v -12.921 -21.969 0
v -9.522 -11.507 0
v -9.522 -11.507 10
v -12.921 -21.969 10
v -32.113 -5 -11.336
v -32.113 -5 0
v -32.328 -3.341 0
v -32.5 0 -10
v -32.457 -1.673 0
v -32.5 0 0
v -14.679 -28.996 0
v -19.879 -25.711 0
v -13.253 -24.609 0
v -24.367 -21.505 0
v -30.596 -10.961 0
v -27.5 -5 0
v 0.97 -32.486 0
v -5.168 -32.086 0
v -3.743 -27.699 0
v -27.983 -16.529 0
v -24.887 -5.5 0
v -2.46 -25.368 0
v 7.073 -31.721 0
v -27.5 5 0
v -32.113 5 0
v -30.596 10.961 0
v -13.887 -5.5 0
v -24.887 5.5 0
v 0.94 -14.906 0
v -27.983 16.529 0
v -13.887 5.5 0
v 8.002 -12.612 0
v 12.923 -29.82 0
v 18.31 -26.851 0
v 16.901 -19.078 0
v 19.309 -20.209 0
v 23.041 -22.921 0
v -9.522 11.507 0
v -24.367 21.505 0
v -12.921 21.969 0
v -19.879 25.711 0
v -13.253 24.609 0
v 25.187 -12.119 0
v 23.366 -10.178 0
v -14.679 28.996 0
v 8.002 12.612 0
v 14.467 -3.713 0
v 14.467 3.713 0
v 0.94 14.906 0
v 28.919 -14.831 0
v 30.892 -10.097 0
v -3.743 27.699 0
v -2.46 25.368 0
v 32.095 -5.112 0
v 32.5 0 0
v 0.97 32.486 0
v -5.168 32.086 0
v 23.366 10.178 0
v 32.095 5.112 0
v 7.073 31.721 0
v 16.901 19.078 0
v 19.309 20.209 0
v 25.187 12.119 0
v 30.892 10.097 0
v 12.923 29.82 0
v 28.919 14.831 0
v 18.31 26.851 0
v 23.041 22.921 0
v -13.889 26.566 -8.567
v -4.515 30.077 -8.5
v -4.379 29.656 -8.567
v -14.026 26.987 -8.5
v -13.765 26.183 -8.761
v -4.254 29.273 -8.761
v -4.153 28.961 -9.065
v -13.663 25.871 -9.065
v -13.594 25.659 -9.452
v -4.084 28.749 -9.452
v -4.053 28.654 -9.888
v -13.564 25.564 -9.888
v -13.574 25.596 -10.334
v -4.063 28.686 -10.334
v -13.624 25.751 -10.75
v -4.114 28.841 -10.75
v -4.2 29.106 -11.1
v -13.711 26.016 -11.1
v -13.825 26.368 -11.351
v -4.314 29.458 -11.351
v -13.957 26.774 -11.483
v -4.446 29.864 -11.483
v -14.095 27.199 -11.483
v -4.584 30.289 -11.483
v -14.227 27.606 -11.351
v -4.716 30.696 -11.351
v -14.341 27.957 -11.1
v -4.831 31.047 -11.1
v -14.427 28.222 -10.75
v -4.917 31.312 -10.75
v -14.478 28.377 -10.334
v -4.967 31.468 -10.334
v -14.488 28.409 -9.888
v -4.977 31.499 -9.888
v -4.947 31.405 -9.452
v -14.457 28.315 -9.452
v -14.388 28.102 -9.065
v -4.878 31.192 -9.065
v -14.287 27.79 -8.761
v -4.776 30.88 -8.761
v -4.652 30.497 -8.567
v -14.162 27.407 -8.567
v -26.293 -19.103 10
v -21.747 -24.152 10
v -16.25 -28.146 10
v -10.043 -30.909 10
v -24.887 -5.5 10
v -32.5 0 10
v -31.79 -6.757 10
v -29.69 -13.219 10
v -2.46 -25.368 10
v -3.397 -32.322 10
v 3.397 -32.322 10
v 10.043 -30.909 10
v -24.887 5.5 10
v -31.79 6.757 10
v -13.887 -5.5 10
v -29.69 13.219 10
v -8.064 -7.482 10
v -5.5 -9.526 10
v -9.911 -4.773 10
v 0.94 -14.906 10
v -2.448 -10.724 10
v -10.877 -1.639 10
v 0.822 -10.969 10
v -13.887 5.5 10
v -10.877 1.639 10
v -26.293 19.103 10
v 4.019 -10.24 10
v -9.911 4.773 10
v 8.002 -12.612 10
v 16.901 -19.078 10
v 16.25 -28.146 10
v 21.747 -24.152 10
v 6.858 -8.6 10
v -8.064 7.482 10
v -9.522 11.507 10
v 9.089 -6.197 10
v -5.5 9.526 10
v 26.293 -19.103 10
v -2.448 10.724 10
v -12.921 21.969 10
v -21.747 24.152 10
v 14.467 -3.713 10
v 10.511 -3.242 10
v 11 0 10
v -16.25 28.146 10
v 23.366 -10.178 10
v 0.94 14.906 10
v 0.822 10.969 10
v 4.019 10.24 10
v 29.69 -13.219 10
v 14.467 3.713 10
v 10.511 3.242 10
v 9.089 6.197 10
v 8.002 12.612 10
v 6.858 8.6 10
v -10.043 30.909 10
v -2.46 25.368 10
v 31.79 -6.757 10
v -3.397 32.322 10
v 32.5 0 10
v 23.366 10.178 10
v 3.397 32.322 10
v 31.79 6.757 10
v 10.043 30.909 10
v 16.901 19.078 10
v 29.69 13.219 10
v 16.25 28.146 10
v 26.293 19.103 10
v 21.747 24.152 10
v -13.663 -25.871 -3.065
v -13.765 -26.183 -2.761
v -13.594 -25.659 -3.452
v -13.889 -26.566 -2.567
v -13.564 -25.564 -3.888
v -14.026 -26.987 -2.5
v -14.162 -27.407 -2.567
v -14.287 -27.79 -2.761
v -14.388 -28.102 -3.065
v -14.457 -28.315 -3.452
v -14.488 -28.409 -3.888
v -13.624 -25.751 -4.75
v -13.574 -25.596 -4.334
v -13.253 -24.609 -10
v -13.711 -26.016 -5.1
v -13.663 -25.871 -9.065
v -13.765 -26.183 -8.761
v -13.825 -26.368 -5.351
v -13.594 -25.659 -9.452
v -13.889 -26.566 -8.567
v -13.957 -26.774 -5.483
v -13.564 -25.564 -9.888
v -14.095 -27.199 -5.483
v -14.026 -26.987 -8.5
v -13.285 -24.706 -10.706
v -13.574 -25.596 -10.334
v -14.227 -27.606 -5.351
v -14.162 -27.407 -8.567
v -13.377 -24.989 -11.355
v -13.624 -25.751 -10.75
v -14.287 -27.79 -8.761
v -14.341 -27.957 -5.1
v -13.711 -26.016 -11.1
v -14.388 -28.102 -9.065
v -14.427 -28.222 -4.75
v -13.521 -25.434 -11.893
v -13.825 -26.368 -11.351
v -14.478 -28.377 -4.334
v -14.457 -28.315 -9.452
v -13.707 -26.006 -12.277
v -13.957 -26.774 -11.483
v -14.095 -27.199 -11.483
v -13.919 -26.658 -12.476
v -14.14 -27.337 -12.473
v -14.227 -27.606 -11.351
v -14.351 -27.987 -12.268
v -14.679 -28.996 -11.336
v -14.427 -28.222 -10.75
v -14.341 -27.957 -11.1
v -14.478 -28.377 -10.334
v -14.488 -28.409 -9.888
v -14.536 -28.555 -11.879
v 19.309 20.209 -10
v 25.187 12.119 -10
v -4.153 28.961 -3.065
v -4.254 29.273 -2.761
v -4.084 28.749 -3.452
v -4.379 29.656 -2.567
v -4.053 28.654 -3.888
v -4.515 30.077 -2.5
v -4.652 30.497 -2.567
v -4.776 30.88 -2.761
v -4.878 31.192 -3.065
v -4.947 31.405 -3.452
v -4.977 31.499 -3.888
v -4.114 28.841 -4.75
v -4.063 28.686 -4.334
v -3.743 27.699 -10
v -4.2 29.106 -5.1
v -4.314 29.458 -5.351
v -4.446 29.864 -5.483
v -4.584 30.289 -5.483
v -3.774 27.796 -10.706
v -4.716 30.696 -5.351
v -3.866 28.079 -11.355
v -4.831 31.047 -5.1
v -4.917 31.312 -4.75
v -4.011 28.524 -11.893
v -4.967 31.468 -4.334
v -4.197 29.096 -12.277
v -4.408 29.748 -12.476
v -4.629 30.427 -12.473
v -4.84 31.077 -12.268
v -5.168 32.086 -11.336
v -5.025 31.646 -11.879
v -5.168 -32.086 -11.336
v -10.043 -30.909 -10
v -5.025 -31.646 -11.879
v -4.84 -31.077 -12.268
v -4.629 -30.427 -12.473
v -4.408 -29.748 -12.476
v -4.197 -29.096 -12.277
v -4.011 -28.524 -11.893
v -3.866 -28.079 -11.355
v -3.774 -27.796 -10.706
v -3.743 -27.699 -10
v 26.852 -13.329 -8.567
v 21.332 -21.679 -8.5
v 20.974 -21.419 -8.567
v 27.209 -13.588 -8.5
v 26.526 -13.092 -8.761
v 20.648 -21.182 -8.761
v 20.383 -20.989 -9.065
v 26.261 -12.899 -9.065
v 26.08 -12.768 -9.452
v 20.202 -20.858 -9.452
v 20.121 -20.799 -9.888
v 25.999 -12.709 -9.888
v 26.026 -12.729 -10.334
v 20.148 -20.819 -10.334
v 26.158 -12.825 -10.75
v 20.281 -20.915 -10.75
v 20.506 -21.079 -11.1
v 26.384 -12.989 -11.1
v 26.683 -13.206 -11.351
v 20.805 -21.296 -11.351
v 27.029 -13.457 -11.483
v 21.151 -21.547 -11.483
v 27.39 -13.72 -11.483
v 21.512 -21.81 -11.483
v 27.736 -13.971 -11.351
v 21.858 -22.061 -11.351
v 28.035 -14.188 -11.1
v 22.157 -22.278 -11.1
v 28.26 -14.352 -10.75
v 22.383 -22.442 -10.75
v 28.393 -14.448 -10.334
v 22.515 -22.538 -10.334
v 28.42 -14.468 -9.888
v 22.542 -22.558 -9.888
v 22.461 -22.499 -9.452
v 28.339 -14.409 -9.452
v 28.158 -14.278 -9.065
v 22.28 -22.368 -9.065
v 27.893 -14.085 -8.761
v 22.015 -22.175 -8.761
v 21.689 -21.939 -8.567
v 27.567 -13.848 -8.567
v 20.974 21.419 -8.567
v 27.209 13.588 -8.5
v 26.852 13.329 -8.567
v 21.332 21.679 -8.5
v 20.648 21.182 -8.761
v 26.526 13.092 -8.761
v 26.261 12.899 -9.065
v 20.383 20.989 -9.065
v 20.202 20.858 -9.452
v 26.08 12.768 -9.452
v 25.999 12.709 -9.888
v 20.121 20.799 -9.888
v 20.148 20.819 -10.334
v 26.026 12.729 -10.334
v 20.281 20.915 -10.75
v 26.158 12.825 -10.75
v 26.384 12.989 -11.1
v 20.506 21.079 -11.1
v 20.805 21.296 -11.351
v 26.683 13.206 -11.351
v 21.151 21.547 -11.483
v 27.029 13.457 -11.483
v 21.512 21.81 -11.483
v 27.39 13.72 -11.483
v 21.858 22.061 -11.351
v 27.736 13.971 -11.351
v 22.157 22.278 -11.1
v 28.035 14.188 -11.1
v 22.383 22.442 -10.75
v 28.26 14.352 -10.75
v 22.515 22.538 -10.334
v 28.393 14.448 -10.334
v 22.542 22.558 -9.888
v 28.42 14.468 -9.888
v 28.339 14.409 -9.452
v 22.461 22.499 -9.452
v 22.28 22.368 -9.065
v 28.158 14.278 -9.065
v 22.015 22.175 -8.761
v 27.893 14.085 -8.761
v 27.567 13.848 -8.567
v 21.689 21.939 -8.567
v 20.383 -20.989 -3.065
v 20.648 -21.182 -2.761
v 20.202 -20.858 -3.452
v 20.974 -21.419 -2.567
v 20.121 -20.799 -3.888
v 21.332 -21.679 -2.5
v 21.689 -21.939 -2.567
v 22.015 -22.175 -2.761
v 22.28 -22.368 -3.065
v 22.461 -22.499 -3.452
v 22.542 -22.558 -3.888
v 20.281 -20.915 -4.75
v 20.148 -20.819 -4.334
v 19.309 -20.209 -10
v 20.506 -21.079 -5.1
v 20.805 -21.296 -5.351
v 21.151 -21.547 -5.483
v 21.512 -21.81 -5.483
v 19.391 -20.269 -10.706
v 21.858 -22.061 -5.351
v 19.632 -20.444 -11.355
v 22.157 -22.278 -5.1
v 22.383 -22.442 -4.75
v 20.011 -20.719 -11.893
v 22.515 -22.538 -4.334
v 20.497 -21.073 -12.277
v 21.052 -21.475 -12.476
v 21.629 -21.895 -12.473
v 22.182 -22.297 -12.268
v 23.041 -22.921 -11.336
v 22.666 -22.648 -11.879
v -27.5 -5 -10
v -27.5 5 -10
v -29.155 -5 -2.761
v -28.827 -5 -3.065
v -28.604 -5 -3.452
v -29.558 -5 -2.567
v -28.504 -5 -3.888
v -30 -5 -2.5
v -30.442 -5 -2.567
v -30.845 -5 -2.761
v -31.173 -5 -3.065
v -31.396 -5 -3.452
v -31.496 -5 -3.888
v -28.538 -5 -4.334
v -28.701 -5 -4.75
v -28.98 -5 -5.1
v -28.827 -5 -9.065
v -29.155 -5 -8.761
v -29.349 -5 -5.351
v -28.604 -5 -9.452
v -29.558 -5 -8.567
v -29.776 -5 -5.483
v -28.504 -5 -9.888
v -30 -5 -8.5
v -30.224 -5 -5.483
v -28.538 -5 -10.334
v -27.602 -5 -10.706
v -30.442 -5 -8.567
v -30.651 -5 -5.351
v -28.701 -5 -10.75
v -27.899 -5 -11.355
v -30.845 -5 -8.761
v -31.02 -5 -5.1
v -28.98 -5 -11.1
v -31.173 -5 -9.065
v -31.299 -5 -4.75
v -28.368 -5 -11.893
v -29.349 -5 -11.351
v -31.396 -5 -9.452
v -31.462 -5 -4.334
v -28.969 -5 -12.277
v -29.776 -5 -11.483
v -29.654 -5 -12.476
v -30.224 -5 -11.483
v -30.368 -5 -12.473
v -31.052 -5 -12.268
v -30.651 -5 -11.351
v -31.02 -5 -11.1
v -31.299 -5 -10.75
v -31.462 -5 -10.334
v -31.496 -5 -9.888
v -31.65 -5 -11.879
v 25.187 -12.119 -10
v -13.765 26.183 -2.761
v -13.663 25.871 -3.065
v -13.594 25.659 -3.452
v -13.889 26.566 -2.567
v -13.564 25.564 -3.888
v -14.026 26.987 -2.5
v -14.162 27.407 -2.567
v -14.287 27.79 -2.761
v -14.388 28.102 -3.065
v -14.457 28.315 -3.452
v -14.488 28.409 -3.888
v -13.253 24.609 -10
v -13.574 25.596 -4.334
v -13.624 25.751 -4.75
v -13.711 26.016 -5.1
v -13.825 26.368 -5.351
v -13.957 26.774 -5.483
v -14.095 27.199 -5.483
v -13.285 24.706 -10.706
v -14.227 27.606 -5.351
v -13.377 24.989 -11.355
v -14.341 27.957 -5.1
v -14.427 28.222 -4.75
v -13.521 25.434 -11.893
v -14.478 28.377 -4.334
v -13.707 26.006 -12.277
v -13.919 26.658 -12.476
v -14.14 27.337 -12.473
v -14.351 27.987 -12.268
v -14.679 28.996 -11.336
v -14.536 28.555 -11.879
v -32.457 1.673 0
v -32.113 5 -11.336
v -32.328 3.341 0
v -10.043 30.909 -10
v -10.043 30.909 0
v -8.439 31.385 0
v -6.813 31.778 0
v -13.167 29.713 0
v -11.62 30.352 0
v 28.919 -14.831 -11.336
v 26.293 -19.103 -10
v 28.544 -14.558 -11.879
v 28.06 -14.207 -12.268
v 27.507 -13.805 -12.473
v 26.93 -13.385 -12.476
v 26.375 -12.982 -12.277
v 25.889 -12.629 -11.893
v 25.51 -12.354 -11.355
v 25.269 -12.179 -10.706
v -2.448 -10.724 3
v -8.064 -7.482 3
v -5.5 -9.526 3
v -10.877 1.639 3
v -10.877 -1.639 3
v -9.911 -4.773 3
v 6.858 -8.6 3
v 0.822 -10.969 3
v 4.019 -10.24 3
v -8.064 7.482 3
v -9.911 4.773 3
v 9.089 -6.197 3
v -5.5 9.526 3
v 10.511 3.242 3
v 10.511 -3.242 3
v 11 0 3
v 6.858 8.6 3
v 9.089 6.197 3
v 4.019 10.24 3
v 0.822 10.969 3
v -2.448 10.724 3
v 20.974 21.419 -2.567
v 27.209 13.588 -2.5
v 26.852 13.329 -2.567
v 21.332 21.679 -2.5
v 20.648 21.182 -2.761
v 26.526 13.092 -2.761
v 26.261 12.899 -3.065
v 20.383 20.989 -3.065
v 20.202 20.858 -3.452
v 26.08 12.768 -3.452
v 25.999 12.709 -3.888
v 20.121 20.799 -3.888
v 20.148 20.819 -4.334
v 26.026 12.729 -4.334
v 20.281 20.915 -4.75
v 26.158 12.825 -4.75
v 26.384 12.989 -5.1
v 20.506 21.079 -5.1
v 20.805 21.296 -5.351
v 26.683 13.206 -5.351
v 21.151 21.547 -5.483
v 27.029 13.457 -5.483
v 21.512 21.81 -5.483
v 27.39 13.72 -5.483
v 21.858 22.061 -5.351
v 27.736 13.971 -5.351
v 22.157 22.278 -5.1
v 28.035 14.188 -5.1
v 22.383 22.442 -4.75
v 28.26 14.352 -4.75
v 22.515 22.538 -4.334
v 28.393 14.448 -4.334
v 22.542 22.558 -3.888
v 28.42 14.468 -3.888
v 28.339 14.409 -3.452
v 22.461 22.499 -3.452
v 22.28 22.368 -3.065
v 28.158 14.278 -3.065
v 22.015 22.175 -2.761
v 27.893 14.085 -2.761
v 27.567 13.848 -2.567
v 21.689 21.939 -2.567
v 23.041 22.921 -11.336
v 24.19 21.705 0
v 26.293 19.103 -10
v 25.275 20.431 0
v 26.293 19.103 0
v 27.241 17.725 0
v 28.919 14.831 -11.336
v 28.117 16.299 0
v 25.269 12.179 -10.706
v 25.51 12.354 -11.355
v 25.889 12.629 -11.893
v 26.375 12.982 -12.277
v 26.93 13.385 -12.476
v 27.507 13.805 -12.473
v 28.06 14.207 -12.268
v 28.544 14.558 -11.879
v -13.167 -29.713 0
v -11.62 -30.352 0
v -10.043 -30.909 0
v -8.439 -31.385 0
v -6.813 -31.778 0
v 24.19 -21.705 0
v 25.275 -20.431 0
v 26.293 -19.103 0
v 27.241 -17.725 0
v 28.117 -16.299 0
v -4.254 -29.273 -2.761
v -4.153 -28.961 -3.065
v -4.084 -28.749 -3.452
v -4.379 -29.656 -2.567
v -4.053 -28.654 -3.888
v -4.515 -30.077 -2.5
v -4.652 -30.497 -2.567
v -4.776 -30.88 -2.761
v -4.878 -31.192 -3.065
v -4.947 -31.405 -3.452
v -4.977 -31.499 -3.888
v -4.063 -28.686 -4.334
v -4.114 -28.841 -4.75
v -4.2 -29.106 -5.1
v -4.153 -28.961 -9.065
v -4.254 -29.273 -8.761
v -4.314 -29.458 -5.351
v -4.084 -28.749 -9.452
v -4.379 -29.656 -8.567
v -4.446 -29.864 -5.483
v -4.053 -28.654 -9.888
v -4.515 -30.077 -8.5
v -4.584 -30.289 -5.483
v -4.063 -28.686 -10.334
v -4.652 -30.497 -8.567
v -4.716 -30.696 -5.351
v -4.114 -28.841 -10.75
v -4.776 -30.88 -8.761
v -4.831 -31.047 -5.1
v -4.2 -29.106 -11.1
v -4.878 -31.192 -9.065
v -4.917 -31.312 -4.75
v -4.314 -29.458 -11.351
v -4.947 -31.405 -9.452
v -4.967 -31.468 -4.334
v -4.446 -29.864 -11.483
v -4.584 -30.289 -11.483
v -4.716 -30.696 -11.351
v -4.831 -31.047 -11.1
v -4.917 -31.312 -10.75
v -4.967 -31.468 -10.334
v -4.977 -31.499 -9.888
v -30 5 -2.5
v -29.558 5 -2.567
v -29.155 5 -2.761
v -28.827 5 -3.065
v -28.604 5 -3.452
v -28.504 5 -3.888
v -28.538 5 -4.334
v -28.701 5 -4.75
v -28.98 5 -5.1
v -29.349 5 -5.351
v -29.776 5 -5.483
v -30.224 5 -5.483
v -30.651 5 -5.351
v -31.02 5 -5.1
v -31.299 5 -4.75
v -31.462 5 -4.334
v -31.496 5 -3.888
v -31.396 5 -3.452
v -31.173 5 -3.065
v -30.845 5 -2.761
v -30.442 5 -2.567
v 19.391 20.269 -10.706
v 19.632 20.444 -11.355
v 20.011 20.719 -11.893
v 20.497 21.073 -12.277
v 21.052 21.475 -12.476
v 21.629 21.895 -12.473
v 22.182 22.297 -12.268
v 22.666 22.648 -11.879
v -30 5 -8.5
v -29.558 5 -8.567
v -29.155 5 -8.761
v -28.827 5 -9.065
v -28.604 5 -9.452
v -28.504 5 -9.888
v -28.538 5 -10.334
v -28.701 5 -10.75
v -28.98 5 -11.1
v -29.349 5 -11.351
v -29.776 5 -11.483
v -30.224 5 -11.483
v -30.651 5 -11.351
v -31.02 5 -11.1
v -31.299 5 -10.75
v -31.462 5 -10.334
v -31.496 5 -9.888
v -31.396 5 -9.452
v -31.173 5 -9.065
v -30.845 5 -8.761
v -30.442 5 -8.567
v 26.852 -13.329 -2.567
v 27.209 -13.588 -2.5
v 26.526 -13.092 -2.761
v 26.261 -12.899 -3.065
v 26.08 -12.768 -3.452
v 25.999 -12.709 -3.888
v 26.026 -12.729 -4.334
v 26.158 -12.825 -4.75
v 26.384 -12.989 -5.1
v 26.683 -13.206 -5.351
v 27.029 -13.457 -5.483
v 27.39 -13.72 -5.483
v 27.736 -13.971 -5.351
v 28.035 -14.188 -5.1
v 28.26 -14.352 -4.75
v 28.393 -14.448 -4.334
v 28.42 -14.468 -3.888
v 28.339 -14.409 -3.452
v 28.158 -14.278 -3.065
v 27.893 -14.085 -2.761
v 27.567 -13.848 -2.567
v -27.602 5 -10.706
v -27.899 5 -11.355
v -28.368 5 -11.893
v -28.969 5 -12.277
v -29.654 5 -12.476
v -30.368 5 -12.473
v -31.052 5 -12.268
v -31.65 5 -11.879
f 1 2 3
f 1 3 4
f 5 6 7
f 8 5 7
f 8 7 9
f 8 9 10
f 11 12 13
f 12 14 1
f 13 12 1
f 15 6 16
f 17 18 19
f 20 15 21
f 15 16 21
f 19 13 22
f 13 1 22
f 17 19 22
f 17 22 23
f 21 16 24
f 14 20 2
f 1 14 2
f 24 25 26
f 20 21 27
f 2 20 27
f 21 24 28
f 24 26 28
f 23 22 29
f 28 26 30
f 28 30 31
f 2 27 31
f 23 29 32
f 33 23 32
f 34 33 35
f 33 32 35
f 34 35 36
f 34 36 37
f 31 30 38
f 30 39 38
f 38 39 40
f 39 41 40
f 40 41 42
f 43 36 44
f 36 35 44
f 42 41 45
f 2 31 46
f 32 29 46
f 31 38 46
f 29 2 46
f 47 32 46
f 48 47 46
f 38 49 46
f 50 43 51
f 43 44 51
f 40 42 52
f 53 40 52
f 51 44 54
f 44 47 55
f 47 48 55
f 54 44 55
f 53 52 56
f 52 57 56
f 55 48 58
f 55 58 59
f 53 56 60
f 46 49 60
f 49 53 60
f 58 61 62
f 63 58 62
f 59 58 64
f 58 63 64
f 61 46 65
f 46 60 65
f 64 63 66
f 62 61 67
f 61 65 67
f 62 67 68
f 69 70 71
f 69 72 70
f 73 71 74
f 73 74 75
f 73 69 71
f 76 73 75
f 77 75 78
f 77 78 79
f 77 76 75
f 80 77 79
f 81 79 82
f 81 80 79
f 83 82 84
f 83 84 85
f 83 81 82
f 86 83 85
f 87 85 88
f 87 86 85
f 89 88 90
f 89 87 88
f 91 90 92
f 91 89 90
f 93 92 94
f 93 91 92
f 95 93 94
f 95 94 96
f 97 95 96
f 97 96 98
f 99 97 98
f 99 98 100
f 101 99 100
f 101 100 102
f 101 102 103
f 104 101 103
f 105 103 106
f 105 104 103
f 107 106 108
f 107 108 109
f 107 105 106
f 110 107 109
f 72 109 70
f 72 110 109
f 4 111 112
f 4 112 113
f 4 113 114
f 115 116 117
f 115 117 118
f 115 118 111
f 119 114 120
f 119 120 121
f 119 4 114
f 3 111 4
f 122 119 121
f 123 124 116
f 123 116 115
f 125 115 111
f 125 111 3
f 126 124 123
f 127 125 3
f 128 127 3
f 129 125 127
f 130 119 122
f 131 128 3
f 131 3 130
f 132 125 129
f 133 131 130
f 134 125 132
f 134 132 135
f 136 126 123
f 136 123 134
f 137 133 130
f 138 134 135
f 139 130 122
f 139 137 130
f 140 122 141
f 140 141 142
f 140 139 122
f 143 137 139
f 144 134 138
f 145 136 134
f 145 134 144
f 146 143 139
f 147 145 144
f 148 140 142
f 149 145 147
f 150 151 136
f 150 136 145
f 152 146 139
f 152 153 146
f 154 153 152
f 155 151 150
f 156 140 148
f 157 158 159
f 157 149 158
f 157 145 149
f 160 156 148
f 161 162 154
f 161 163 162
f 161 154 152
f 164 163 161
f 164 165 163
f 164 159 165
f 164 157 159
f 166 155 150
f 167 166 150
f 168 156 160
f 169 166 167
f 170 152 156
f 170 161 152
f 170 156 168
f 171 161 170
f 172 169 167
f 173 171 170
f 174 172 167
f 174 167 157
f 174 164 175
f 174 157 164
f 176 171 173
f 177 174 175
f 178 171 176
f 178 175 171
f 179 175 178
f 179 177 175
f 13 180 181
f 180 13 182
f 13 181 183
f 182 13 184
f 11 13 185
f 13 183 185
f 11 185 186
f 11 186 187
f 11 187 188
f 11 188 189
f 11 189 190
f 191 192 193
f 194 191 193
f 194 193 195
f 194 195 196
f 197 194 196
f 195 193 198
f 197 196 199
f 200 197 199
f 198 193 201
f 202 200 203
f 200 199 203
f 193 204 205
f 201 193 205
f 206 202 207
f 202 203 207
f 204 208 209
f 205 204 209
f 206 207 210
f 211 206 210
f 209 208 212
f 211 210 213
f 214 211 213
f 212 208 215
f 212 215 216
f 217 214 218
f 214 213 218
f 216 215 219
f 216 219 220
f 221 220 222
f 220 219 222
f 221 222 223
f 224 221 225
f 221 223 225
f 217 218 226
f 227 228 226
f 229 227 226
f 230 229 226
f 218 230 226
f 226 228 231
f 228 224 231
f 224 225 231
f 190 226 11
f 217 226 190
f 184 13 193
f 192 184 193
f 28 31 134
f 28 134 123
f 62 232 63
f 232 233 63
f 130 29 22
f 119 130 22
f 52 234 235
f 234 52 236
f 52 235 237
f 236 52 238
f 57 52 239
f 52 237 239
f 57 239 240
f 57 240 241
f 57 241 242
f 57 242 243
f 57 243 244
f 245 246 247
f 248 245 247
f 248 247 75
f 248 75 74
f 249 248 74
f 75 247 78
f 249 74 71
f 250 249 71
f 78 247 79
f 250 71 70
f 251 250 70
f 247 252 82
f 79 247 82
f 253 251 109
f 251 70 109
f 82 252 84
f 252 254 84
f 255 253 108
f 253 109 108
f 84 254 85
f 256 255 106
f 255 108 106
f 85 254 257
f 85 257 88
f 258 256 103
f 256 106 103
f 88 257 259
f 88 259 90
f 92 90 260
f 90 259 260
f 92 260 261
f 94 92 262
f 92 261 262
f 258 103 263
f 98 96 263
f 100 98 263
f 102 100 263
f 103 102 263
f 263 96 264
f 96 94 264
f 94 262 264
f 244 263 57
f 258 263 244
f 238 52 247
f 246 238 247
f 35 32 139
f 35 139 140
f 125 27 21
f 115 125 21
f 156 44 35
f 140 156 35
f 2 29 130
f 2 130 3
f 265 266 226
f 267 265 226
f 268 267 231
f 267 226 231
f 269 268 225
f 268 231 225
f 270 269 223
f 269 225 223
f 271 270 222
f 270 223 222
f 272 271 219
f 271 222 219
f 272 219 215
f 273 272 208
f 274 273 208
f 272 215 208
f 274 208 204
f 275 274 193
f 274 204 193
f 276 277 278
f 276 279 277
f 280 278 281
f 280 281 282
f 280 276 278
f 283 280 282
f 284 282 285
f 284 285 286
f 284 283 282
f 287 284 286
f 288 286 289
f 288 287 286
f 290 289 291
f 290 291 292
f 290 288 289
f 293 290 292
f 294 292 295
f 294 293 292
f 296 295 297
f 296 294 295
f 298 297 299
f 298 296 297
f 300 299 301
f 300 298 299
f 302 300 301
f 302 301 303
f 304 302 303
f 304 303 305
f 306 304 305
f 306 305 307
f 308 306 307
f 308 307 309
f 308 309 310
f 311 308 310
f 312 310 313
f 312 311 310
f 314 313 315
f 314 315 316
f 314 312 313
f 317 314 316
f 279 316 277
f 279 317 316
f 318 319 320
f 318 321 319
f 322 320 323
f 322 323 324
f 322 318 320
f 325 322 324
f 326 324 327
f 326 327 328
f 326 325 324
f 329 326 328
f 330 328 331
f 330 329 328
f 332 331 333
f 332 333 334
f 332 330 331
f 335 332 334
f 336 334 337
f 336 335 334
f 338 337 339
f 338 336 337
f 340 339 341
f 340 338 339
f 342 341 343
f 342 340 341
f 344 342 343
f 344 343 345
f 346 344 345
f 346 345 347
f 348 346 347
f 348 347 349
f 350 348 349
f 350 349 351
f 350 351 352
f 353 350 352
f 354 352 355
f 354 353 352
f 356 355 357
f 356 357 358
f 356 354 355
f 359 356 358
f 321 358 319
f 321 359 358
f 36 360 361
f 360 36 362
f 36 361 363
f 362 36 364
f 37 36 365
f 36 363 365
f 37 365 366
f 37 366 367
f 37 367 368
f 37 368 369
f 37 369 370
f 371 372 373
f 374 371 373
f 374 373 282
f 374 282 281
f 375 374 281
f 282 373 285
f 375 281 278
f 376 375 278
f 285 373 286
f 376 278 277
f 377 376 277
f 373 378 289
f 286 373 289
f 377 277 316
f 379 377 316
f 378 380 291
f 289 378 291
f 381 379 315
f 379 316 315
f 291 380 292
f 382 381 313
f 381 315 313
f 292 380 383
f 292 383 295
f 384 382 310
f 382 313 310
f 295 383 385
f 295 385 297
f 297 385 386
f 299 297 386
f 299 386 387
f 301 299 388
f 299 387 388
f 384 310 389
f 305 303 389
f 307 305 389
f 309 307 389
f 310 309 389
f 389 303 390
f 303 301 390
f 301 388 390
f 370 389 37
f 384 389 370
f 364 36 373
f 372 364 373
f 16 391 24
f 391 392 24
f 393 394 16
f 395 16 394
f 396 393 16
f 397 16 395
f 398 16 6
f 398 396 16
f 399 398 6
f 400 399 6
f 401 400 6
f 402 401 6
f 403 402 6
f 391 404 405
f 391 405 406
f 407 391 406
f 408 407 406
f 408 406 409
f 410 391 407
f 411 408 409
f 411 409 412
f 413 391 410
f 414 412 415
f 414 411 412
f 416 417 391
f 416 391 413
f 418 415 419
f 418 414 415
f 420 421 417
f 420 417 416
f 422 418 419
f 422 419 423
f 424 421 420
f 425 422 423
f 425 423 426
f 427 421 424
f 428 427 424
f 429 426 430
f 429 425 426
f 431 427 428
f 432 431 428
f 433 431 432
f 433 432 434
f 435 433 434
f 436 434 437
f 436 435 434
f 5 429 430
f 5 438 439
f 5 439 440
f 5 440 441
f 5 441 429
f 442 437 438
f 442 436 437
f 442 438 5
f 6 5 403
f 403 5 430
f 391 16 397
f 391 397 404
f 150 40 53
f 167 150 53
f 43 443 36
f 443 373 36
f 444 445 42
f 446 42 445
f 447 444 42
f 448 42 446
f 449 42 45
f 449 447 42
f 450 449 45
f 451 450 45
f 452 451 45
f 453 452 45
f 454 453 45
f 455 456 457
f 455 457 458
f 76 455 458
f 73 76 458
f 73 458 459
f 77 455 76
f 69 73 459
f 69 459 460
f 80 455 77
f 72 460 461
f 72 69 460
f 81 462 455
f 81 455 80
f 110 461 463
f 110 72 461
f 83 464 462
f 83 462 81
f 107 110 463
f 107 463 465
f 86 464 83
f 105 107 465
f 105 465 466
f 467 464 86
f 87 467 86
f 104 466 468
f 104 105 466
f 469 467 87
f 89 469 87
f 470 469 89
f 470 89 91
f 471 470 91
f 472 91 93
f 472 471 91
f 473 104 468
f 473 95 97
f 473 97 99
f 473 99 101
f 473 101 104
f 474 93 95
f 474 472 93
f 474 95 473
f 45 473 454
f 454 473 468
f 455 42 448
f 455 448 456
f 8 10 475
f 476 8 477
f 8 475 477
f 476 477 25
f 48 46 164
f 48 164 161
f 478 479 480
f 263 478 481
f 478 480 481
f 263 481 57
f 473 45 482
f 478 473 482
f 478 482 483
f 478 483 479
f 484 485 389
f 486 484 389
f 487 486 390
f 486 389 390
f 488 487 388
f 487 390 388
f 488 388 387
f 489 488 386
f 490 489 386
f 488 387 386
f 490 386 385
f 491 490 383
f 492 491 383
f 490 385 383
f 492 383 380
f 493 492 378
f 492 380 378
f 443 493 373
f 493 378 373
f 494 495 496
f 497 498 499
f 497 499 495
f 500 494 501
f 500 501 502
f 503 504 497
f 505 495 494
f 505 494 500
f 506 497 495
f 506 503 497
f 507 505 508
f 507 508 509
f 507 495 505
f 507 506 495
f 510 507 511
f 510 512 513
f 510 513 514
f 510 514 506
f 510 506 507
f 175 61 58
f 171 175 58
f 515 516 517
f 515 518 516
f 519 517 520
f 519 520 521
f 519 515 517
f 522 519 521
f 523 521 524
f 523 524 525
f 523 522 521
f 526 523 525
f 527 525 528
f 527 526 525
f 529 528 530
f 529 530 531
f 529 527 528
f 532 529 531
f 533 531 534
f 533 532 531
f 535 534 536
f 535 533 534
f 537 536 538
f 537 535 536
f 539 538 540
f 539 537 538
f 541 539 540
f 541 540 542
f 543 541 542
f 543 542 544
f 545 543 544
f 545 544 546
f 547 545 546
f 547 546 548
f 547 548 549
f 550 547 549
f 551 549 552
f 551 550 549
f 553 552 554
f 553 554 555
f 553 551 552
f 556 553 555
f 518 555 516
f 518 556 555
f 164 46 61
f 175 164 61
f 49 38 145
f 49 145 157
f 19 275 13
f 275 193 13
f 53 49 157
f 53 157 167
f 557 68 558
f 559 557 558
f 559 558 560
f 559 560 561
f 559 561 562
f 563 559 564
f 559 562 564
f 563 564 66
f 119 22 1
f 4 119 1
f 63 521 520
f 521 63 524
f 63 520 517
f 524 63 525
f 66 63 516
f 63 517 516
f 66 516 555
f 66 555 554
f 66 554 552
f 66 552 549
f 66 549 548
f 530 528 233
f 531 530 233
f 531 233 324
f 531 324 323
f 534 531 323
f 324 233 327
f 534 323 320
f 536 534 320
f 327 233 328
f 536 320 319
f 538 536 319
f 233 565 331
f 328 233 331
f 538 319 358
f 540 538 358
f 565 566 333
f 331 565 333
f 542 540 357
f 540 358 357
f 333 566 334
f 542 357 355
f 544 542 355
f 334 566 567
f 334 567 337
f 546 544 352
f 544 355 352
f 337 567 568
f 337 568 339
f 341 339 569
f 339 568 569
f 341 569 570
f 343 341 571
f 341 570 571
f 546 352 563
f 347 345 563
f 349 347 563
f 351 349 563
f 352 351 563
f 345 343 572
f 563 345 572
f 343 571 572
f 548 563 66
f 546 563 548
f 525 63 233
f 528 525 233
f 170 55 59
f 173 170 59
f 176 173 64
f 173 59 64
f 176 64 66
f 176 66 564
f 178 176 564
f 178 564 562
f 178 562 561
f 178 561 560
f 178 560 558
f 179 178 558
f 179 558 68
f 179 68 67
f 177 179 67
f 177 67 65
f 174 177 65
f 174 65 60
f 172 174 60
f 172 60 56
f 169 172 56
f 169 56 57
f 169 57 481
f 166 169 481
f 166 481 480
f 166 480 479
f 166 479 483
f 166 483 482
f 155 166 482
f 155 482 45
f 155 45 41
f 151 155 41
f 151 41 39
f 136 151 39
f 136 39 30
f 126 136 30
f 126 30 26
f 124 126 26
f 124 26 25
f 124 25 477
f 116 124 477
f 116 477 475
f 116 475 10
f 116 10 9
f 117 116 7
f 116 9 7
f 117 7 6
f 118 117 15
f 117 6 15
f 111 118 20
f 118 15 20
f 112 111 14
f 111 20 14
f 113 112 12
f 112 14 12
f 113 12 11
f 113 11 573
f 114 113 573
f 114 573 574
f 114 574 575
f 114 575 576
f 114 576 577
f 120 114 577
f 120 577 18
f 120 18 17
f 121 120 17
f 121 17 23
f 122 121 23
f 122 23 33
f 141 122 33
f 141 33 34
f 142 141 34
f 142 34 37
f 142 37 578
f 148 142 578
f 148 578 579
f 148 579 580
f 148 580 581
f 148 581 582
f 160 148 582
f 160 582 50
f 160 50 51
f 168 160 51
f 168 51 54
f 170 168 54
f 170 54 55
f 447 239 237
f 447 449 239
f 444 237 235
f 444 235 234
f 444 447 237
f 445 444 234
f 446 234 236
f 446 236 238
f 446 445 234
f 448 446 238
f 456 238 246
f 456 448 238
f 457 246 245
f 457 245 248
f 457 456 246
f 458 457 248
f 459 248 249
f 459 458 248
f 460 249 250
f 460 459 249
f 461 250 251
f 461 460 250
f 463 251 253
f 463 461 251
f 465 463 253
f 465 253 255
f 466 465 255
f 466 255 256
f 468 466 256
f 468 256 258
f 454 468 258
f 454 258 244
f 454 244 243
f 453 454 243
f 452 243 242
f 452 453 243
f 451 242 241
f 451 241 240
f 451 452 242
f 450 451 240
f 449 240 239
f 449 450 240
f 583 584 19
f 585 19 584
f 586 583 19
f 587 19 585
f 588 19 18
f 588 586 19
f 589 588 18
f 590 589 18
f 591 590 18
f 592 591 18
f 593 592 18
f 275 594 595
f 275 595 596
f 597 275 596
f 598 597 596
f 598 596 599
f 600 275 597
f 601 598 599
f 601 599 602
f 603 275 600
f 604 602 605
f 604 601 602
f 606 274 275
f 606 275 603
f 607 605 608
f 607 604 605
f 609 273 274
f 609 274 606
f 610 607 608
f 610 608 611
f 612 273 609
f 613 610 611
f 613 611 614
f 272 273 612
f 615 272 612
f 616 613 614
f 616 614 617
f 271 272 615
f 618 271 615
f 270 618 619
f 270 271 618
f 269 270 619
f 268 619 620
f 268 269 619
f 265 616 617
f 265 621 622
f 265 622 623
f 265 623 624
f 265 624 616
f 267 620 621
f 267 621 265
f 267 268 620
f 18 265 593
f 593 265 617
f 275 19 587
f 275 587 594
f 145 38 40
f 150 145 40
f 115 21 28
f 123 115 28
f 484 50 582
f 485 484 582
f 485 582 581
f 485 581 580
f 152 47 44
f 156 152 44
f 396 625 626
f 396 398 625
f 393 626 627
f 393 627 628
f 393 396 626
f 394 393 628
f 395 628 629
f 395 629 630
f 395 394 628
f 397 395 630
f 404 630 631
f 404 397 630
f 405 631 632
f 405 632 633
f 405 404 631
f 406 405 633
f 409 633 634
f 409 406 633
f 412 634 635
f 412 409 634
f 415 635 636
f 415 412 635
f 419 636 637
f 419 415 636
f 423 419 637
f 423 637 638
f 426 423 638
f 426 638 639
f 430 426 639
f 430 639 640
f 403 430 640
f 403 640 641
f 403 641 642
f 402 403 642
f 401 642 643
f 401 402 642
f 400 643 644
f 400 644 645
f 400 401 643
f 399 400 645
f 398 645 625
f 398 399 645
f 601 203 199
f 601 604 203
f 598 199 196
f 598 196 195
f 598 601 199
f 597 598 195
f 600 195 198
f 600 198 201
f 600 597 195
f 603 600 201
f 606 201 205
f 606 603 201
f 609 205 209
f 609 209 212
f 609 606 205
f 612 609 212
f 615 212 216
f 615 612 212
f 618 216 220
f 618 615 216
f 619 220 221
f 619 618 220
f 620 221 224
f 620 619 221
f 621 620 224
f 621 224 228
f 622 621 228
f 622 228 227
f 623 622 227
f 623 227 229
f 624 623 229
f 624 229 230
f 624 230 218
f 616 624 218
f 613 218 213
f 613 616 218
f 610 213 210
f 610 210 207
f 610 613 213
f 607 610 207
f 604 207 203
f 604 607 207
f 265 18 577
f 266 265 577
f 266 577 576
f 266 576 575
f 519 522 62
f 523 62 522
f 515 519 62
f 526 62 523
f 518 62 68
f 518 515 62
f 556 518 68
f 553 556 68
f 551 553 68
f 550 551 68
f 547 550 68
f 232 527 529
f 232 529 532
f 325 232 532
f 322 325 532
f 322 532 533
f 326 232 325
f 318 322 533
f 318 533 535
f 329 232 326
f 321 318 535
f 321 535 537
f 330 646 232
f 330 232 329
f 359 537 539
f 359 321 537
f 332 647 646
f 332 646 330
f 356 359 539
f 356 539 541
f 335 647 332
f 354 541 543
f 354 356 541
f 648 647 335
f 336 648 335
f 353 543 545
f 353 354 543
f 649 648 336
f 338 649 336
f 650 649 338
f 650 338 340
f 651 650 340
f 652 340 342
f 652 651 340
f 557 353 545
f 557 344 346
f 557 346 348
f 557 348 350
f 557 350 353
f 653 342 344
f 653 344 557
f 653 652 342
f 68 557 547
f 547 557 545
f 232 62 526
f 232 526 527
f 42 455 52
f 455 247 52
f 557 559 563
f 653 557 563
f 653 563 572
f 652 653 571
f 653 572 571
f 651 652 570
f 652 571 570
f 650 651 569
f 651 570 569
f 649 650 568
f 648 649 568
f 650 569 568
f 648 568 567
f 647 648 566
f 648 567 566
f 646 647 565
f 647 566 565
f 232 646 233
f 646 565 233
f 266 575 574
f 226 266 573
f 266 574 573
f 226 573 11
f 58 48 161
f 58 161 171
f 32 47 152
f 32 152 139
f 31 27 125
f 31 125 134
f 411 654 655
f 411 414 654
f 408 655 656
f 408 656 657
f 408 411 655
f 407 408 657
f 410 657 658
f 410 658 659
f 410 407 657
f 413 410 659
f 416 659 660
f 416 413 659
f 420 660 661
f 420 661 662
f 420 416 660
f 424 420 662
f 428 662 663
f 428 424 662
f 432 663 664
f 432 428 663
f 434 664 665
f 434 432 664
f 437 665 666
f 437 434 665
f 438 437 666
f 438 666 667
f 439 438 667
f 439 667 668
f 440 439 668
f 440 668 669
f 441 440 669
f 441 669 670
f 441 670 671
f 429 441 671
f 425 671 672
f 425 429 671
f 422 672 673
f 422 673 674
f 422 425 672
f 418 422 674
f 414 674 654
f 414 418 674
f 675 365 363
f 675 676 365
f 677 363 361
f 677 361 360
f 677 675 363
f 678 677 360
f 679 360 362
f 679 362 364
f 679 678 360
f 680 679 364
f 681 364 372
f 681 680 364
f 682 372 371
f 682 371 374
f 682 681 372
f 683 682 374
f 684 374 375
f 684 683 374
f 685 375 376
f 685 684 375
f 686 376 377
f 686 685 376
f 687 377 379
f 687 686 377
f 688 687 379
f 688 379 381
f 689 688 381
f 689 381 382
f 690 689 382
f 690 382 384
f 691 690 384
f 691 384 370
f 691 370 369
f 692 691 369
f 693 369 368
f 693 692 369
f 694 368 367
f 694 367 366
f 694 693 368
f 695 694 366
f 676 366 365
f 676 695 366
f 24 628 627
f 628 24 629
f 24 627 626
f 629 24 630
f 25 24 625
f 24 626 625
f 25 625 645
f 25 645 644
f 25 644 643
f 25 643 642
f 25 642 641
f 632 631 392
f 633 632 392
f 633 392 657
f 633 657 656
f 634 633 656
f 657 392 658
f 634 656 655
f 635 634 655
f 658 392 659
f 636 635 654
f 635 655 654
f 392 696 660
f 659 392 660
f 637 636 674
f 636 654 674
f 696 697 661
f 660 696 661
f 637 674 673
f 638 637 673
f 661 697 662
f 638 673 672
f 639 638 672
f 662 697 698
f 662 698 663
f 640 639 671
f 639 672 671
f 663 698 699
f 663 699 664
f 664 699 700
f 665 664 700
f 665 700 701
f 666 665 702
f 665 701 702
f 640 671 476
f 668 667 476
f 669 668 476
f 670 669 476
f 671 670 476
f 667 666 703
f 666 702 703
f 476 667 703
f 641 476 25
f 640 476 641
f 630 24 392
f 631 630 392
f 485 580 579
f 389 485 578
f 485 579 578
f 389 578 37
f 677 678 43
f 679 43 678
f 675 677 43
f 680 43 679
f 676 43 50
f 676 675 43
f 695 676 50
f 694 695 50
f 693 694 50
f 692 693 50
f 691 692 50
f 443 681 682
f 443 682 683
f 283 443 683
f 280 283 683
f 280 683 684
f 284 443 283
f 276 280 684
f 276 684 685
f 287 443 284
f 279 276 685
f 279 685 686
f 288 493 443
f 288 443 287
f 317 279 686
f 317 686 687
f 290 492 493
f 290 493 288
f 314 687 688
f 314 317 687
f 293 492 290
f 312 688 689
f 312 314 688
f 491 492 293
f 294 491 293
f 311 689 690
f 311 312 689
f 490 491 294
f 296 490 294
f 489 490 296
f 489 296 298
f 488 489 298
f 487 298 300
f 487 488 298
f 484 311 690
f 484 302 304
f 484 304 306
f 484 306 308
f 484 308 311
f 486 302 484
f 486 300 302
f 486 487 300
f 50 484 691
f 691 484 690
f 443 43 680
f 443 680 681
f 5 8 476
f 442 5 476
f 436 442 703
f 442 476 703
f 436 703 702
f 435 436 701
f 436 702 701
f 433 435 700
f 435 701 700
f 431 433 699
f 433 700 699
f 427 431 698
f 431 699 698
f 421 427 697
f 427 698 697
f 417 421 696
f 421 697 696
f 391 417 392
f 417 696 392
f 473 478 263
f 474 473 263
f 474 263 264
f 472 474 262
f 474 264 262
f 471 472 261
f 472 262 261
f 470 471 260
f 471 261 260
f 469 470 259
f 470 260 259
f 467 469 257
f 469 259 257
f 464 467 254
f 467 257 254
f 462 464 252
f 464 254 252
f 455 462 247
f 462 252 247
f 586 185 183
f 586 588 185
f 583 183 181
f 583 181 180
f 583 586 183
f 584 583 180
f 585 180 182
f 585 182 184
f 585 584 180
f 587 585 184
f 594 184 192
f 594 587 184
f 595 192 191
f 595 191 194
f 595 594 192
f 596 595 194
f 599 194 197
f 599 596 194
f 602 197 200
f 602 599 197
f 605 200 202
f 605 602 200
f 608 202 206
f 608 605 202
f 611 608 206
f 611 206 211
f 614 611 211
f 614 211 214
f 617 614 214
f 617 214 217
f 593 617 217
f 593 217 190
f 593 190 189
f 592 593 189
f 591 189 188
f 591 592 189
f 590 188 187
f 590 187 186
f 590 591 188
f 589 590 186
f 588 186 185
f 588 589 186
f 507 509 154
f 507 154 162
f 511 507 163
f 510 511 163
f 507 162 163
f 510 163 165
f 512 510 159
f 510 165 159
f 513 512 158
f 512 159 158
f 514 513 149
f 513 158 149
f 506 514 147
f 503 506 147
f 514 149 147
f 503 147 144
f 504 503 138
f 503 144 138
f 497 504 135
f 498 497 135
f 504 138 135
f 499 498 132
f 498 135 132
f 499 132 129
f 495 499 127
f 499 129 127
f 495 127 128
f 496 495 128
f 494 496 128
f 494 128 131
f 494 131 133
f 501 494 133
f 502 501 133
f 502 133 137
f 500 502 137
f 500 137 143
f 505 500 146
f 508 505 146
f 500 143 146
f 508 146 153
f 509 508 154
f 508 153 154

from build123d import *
from build123d.topology import SkipClean

# Parameters (mm, degrees)
ESQUISSE1_R                  = 32.5
BOSS_EXTRU_1_DEPTH           = 10
ESQUISSE2_R                  = 1.5
BOSS_EXTRU_2_DEPTH           = 5
ENL_V_MAT_EXTRU_1_DEPTH      = 48.631397208
R_P_TITION_CIRCULAIRE1_COUNT = 5
ENL_V_MAT_EXTRU_3_DEPTH      = 48.631397303
R_P_TITION_CIRCULAIRE2_COUNT = 5
ESQUISSE5_R                  = 11
ENL_V_MAT_EXTRU_4_DEPTH      = 7


with BuildPart() as part:
    # Esquisse1 → Boss.-Extru.1 (new body)
    with BuildSketch(Plane.XY):
        Circle(ESQUISSE1_R)
    extrude(amount=BOSS_EXTRU_1_DEPTH)

    # Esquisse2 → Boss.-Extru.2 (add, symmetric)
    with BuildSketch(Plane(origin=(0, 0, 0), x_dir=(1, 0, 0), z_dir=(0, 1, 0))):
        with BuildLine():
            Line((-32.5, 0), (-32.5, 10))
            ThreePointArc((-32.5, 10), (-30, 12.5), (-27.5, 10))
            Line((-27.5, 10), (-27.5, 0))
            Line((-27.5, 0), (-32.5, 0))
        make_face()
        with Locations((-30, 10)):
            Circle(ESQUISSE2_R, mode=Mode.SUBTRACT)
        with Locations((-30, 4)):
            Circle(ESQUISSE2_R, mode=Mode.SUBTRACT)
    boss_extru_2 = extrude(amount=BOSS_EXTRU_2_DEPTH, both=True)

    # Esquisse3 → Enlèv. mat.-Extru.1 (cut, through all)
    with SkipClean():  # the faces are left unmerged after this step: merging them gives an invalid solid
        with BuildSketch(Plane.XY):
            with BuildLine():
                ThreePointArc((-32.5, 0), (-32.403125984, 2.507474126), (-32.113081447, 5))
                Line((-32.113081447, 5), (-32.5, 5))
                Line((-32.5, 5), (-32.5, 0))
            make_face()
            with BuildLine():
                ThreePointArc((-32.113081447, -5), (-32.403125984, -2.507474126), (-32.5, 0))
                Line((-32.5, 0), (-32.5, -5))
                Line((-32.5, -5), (-32.113081447, -5))
            make_face()
        enl_v_mat_extru_1 = extrude(amount=-ENL_V_MAT_EXTRU_1_DEPTH, mode=Mode.SUBTRACT)

    # Répétition circulaire1: Boss.-Extru.2, Enlèv. mat.-Extru.1 ×5 about axis
    with SkipClean():  # the faces are left unmerged after this step: merging them gives an invalid solid
        r_p_tition_circulaire1_axis = Axis((0, 0, 0), (0, 0, 1))
        add([boss_extru_2.rotate(r_p_tition_circulaire1_axis, i * 360 / R_P_TITION_CIRCULAIRE1_COUNT) for i in range(1, R_P_TITION_CIRCULAIRE1_COUNT)])
        add([enl_v_mat_extru_1.rotate(r_p_tition_circulaire1_axis, i * 360 / R_P_TITION_CIRCULAIRE1_COUNT) for i in range(1, R_P_TITION_CIRCULAIRE1_COUNT)], mode=Mode.SUBTRACT)

    # Esquisse4 → Enlèv. mat.-Extru.3 (cut, through all)
    with SkipClean():  # the faces are left unmerged after this step: merging them gives an invalid solid
        with BuildSketch(Plane(origin=(0, 0, 0), x_dir=(-1, 0, 0), z_dir=(0, 0, -1))):
            Polygon((18.761540723, 5.5), (13.886540723, 5.5), (13.886540723, -5.5), (18.761540723, -5.5), (24.011540723, -5.5), (24.886540723, -5.5), (24.886540723, 5.5), (24.011540723, 5.5), align=None)
        enl_v_mat_extru_3 = extrude(amount=-ENL_V_MAT_EXTRU_3_DEPTH, mode=Mode.SUBTRACT)

    # Répétition circulaire2: Enlèv. mat.-Extru.3 ×5 about axis
    with SkipClean():  # the faces are left unmerged after this step: merging them gives an invalid solid
        r_p_tition_circulaire2_axis = Axis((0, 0, 0), (0, 0, 1))
        for i in range(1, R_P_TITION_CIRCULAIRE2_COUNT):
            add(enl_v_mat_extru_3.rotate(r_p_tition_circulaire2_axis, i * 360 / R_P_TITION_CIRCULAIRE2_COUNT), mode=Mode.SUBTRACT)

    # Esquisse5 → Enlèv. mat.-Extru.4 (cut)
    with SkipClean():  # the faces are left unmerged after this step: merging them gives an invalid solid
        with BuildSketch(Plane.XY.offset(10)):
            Circle(ESQUISSE5_R)
        extrude(amount=-ENL_V_MAT_EXTRU_4_DEPTH, mode=Mode.SUBTRACT)


solid = part.part
